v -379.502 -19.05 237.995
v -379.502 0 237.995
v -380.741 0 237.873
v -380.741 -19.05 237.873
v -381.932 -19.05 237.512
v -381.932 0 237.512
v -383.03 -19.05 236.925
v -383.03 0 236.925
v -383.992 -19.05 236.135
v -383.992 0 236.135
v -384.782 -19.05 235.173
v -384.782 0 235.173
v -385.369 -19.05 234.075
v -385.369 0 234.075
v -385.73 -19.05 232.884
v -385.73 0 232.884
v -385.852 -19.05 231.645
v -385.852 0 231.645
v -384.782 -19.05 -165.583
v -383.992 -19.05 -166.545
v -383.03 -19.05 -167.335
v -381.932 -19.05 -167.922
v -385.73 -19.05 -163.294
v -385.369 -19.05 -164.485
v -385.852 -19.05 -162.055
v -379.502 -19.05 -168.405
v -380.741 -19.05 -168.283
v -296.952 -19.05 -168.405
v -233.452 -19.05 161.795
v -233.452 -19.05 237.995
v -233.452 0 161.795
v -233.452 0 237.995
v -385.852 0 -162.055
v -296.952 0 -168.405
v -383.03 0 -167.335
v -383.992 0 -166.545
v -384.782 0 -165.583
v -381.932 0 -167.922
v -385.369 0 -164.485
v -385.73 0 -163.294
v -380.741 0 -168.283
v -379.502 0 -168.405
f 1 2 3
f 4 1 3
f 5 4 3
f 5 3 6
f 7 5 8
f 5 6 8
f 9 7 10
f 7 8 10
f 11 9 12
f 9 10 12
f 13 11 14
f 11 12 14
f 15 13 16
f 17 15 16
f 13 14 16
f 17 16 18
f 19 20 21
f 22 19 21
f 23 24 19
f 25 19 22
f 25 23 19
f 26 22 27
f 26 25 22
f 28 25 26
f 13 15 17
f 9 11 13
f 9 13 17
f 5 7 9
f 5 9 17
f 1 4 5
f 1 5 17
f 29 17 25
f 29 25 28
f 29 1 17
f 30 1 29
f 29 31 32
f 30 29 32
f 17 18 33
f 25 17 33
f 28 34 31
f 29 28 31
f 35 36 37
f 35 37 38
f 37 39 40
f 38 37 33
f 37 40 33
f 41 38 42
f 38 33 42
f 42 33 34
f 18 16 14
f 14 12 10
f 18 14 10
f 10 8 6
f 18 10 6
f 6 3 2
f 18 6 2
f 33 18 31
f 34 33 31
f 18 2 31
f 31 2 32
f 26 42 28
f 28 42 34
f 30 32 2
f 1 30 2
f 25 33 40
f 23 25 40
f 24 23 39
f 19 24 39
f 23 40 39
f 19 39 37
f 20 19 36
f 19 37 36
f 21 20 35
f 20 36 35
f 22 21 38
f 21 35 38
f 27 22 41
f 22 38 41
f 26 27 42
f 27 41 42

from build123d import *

# Parameters (mm, degrees)
F1_DEPTH = 19.05


with BuildPart() as f1:
    # F0 (on Front) → F1 (new body)
    with BuildSketch(Plane.XZ):
        with BuildLine():
            Line((-233.45189, 237.994913), (-379.50189, 237.994913))
            ThreePointArc((-379.50189, 237.994913), (-383.992018, 236.135041), (-385.85189, 231.644913))
            Line((-385.85189, 231.644913), (-385.85189, -162.055087))
            ThreePointArc((-385.85189, -162.055087), (-383.992018, -166.545215), (-379.50189, -168.405087))
            Line((-379.50189, -168.405087), (-296.95189, -168.405087))
            Line((-296.95189, -168.405087), (-233.45189, 161.794913))
            Line((-233.45189, 161.794913), (-233.45189, 237.994913))
        make_face()
    extrude(amount=F1_DEPTH)


solid = f1.part
